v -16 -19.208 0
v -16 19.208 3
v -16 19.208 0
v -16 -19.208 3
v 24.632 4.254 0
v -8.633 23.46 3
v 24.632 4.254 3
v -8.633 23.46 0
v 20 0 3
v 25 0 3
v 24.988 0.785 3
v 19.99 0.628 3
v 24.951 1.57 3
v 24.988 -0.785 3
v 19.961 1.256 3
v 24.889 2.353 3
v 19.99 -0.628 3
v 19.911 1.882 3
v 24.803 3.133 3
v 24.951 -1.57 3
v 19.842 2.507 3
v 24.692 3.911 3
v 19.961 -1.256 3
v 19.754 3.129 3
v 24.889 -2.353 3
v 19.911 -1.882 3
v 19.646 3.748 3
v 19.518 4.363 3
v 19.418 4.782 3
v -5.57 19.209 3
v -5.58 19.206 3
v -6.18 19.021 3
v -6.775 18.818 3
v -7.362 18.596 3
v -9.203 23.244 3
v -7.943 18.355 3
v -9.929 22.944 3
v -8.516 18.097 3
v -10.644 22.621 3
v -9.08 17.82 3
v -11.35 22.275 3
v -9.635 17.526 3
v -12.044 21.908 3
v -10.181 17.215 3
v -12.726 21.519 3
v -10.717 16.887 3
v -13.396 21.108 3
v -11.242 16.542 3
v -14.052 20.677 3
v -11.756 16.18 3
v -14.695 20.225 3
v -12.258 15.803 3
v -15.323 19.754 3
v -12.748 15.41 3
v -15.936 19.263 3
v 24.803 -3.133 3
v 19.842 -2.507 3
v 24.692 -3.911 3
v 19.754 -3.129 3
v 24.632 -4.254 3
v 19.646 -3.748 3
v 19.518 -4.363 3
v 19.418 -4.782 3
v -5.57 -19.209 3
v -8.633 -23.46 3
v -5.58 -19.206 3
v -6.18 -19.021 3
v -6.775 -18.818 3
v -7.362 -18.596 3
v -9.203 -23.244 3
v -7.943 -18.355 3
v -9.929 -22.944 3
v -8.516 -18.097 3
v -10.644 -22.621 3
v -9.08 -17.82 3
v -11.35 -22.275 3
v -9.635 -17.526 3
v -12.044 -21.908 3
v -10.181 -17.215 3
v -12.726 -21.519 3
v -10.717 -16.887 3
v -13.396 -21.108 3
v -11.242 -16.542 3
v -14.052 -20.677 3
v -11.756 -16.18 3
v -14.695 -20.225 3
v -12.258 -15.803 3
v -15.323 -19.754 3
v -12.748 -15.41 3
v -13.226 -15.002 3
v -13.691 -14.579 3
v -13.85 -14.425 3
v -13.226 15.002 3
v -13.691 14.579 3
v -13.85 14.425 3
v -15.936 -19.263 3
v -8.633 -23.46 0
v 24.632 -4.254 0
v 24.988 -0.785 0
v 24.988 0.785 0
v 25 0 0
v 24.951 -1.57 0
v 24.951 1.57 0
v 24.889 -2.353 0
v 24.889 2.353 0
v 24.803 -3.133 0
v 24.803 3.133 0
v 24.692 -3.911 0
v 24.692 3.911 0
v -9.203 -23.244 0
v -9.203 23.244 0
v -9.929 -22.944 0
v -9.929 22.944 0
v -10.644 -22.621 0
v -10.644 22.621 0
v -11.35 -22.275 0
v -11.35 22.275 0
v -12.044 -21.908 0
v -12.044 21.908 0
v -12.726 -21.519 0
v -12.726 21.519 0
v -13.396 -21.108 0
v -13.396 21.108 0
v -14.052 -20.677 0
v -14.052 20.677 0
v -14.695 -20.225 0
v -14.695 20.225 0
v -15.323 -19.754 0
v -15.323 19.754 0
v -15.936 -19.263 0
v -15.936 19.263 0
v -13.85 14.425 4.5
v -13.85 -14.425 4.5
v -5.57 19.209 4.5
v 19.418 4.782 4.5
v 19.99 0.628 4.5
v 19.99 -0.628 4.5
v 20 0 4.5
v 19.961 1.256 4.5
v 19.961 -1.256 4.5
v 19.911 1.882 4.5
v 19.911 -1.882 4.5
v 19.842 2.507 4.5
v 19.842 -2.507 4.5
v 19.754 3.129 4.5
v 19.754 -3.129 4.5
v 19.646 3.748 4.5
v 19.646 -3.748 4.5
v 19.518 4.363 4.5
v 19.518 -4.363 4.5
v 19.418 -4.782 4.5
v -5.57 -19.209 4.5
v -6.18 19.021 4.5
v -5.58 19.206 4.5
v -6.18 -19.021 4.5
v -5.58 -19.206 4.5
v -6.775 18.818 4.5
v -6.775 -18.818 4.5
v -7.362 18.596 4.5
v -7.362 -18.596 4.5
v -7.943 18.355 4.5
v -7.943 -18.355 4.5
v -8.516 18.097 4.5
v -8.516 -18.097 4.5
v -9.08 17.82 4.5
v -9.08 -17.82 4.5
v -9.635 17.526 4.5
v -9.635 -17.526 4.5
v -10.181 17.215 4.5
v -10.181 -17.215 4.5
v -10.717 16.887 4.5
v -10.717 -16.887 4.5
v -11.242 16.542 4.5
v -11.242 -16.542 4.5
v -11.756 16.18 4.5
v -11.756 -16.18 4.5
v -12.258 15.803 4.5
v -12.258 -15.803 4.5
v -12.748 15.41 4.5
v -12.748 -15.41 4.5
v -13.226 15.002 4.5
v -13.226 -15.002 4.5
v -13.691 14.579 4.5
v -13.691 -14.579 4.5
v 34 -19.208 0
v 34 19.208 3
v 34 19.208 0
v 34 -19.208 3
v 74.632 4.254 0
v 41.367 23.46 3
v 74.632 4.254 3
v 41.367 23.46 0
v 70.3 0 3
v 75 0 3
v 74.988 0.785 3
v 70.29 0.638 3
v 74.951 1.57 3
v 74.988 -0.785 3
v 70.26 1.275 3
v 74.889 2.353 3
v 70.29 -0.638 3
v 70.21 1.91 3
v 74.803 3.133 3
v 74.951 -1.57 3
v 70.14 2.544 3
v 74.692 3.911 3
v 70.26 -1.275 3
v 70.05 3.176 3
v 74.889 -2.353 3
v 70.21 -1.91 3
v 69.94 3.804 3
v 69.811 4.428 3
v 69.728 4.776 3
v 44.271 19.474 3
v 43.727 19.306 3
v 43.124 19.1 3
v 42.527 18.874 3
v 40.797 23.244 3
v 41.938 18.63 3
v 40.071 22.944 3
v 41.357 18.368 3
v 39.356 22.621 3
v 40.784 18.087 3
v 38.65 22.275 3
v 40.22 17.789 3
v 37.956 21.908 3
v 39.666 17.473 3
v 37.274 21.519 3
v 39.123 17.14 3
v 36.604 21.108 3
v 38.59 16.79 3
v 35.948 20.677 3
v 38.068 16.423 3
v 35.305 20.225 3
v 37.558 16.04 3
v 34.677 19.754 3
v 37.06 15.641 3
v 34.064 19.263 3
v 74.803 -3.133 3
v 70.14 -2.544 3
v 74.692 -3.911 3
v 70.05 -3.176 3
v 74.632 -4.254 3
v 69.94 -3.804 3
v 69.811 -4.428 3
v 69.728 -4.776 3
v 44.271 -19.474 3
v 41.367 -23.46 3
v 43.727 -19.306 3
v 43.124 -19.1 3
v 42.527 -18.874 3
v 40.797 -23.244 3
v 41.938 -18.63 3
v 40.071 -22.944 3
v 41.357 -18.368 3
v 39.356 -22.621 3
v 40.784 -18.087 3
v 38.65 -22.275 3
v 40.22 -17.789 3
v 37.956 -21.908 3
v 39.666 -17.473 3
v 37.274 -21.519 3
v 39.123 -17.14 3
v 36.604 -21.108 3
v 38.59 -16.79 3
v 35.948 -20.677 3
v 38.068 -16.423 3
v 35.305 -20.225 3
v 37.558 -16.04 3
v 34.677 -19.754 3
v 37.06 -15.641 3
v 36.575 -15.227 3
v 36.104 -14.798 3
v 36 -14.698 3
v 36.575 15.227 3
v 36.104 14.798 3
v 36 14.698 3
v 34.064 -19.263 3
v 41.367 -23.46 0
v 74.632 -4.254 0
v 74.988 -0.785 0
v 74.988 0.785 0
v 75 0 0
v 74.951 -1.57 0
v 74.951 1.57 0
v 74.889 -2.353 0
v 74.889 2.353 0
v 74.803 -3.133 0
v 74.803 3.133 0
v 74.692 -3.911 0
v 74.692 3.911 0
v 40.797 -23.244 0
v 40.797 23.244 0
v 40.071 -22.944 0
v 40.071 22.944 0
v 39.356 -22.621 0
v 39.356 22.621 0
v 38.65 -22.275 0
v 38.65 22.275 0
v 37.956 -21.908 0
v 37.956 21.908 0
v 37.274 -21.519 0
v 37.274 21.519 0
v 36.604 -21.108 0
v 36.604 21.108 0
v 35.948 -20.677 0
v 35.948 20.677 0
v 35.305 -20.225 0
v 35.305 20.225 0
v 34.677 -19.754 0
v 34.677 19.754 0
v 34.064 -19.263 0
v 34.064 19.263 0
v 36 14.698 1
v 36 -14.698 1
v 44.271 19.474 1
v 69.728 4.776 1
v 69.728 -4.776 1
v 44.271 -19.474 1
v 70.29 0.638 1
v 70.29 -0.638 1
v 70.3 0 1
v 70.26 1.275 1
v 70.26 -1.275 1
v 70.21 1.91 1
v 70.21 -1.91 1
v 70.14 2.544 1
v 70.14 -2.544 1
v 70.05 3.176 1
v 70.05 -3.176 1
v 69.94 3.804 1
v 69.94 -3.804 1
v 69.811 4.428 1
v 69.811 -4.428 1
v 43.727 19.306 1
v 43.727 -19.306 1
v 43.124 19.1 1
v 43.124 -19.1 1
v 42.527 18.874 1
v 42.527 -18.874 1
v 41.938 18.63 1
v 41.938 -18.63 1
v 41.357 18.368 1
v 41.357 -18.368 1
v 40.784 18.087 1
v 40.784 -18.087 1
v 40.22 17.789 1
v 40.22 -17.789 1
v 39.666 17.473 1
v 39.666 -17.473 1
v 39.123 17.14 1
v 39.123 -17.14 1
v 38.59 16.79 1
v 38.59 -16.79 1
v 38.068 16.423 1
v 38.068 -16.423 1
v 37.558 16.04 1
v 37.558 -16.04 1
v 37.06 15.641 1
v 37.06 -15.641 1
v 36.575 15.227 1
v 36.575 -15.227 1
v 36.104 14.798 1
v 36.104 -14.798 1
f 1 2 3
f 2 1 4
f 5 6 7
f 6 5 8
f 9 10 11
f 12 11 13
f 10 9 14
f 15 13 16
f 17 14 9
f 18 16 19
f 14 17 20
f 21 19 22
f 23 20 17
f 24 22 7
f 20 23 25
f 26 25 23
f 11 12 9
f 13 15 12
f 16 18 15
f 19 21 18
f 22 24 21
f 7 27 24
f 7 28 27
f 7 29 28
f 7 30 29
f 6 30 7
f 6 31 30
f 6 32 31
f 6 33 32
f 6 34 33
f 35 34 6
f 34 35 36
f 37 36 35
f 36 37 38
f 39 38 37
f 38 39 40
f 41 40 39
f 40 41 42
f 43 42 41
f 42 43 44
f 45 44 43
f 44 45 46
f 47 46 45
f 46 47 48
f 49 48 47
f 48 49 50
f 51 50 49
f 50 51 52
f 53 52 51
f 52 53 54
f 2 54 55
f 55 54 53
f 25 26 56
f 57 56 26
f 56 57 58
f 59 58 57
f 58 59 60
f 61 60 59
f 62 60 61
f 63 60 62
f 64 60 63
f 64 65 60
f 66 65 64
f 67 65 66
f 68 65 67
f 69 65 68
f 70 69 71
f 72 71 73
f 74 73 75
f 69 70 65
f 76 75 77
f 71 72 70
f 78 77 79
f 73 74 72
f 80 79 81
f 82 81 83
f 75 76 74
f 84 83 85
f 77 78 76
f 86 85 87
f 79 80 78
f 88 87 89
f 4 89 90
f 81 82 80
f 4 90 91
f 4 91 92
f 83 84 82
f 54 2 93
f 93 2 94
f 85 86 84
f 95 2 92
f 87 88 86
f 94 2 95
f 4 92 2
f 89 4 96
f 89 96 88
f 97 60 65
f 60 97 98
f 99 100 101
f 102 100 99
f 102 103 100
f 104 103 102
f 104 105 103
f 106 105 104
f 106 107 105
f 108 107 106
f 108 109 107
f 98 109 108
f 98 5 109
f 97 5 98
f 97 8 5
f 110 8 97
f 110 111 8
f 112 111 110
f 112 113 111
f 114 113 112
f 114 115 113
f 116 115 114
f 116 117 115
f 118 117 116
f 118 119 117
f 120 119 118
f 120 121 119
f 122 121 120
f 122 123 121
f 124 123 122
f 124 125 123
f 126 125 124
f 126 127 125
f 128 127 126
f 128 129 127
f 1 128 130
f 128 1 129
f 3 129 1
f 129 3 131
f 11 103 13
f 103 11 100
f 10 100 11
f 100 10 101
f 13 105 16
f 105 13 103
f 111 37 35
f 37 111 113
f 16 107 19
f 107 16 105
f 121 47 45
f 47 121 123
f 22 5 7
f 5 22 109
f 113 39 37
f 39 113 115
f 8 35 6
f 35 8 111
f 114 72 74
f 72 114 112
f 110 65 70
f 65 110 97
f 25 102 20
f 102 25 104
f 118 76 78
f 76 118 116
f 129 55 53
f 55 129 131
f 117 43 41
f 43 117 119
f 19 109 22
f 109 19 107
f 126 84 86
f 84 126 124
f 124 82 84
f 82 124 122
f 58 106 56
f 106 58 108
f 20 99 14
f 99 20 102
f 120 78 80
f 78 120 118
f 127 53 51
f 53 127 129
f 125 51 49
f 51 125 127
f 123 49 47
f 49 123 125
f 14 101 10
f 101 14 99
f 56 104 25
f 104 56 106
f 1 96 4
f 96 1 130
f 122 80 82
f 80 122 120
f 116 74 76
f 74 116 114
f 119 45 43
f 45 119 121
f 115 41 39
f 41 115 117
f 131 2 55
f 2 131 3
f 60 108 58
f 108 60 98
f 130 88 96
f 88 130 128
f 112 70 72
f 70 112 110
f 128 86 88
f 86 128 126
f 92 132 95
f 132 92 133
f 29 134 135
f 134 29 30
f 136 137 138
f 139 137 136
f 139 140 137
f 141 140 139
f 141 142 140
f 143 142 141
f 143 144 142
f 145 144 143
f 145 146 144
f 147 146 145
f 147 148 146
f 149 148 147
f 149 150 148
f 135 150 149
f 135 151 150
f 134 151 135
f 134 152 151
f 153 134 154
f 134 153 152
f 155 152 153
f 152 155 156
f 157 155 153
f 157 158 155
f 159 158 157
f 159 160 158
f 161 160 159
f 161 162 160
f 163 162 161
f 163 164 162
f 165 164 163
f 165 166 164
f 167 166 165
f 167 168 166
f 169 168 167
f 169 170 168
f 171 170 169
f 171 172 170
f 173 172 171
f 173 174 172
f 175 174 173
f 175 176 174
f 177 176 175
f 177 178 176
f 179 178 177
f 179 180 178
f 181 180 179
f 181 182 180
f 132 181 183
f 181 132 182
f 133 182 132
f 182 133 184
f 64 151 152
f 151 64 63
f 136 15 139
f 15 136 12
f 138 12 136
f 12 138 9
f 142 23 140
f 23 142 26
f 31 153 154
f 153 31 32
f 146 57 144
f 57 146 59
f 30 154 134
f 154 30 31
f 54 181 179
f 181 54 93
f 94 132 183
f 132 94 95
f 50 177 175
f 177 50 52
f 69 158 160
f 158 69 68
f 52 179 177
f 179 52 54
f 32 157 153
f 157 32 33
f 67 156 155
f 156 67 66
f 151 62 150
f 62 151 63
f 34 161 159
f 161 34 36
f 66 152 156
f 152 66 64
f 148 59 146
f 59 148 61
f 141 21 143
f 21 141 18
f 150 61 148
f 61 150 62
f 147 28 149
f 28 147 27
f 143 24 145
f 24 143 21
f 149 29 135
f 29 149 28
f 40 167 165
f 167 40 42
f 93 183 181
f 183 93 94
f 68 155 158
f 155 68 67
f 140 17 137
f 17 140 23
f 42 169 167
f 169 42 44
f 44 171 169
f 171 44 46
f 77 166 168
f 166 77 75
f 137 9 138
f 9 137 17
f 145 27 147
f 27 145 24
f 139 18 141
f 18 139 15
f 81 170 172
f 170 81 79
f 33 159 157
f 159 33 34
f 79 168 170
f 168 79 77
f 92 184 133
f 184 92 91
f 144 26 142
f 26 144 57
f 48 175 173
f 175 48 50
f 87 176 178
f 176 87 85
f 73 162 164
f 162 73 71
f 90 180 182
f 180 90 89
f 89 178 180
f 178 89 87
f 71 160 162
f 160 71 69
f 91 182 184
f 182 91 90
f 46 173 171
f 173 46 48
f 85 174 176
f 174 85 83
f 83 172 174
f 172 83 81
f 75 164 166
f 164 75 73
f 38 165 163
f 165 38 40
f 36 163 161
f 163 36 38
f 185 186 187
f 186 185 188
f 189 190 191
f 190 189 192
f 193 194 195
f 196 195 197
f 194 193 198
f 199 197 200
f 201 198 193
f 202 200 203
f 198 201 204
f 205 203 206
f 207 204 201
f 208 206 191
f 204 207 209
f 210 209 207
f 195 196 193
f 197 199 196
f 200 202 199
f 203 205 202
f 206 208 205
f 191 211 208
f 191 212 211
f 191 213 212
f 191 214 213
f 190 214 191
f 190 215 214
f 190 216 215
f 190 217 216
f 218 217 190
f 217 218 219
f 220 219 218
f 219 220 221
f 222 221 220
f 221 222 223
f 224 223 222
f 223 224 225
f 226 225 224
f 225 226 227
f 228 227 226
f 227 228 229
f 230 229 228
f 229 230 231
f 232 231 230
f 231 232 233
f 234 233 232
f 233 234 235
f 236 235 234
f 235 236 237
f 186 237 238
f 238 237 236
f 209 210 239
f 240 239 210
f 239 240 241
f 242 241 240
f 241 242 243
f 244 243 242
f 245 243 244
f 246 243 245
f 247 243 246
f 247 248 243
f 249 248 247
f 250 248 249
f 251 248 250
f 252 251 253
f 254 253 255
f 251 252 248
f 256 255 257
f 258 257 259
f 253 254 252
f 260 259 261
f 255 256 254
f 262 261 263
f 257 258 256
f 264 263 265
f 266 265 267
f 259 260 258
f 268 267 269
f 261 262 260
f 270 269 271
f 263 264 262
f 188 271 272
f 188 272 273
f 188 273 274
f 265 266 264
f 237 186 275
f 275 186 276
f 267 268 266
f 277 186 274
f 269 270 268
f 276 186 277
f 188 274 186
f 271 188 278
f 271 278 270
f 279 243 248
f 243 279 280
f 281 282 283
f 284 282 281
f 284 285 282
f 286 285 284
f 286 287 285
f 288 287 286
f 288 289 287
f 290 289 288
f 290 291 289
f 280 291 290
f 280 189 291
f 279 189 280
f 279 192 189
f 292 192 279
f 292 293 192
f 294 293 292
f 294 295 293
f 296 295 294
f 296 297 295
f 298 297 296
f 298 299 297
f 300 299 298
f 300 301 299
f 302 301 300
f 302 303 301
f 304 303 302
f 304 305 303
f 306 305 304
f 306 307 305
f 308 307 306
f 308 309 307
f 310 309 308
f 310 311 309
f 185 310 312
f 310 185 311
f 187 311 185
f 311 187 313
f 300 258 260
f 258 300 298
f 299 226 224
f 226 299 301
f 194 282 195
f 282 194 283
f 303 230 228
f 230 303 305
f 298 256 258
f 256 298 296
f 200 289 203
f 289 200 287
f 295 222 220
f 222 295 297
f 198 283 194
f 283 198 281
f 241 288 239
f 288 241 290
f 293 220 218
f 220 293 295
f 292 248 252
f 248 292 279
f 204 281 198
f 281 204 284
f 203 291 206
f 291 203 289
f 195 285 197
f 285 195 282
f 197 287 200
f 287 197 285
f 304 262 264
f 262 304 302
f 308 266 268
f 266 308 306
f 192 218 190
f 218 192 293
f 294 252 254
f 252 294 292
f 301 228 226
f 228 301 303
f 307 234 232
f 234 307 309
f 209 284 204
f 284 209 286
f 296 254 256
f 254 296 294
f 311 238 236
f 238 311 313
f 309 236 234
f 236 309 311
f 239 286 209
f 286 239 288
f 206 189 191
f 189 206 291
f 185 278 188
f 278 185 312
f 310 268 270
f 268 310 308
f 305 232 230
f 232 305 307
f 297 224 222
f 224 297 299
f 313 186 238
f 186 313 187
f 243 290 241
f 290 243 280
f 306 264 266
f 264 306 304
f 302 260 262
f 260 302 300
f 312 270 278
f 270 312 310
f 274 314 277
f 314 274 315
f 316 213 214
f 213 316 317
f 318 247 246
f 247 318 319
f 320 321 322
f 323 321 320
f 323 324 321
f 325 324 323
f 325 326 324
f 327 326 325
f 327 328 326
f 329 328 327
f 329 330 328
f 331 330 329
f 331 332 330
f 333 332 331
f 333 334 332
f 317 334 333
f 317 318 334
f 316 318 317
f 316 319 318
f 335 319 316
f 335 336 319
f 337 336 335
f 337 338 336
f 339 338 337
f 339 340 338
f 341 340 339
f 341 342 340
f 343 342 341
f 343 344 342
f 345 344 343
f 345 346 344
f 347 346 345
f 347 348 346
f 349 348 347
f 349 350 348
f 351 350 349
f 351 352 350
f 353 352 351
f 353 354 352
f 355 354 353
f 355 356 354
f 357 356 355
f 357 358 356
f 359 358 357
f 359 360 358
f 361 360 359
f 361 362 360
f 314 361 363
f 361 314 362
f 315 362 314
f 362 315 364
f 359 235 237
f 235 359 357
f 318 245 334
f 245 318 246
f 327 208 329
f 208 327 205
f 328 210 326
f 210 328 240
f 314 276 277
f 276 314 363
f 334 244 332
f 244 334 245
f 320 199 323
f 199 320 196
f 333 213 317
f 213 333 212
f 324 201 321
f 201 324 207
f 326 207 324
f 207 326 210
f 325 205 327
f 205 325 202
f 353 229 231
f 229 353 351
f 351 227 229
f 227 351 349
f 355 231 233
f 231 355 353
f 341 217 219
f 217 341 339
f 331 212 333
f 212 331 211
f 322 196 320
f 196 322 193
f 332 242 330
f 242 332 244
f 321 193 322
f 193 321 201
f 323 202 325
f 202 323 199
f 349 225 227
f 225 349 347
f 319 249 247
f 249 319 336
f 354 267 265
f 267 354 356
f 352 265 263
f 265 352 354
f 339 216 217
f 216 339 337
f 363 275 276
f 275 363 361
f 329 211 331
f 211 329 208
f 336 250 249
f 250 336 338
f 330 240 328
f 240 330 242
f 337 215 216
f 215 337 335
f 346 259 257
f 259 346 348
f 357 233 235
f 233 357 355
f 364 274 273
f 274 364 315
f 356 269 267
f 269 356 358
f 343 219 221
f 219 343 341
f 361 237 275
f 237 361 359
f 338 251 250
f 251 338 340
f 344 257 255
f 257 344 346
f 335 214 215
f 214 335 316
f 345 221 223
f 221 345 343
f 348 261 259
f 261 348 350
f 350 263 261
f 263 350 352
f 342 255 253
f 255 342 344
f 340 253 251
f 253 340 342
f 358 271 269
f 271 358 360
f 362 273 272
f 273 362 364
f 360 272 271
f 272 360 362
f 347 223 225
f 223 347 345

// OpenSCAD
intersection(){
    cylinder (h = 3, r = 32, $fn=3);
    cylinder (h = 3, r = 25, $fn=200);
}
translate([0, 0, 3])
intersection(){
    cylinder (h = 1.5, r = 27.7, $fn=3);
    cylinder (h = 1.5, r = 20, $fn=200);
}

translate([50, 0 , 0])
difference(){
    intersection(){
        cylinder (h = 3, r = 32, $fn=3);
        cylinder (h = 3, r = 25, $fn=200);
    }
    translate([0, 0, 1])
    intersection(){
        cylinder (h = 2, r = 28, $fn=3);
        cylinder (h = 2, r = 20.3, $fn=200);
    }
}
